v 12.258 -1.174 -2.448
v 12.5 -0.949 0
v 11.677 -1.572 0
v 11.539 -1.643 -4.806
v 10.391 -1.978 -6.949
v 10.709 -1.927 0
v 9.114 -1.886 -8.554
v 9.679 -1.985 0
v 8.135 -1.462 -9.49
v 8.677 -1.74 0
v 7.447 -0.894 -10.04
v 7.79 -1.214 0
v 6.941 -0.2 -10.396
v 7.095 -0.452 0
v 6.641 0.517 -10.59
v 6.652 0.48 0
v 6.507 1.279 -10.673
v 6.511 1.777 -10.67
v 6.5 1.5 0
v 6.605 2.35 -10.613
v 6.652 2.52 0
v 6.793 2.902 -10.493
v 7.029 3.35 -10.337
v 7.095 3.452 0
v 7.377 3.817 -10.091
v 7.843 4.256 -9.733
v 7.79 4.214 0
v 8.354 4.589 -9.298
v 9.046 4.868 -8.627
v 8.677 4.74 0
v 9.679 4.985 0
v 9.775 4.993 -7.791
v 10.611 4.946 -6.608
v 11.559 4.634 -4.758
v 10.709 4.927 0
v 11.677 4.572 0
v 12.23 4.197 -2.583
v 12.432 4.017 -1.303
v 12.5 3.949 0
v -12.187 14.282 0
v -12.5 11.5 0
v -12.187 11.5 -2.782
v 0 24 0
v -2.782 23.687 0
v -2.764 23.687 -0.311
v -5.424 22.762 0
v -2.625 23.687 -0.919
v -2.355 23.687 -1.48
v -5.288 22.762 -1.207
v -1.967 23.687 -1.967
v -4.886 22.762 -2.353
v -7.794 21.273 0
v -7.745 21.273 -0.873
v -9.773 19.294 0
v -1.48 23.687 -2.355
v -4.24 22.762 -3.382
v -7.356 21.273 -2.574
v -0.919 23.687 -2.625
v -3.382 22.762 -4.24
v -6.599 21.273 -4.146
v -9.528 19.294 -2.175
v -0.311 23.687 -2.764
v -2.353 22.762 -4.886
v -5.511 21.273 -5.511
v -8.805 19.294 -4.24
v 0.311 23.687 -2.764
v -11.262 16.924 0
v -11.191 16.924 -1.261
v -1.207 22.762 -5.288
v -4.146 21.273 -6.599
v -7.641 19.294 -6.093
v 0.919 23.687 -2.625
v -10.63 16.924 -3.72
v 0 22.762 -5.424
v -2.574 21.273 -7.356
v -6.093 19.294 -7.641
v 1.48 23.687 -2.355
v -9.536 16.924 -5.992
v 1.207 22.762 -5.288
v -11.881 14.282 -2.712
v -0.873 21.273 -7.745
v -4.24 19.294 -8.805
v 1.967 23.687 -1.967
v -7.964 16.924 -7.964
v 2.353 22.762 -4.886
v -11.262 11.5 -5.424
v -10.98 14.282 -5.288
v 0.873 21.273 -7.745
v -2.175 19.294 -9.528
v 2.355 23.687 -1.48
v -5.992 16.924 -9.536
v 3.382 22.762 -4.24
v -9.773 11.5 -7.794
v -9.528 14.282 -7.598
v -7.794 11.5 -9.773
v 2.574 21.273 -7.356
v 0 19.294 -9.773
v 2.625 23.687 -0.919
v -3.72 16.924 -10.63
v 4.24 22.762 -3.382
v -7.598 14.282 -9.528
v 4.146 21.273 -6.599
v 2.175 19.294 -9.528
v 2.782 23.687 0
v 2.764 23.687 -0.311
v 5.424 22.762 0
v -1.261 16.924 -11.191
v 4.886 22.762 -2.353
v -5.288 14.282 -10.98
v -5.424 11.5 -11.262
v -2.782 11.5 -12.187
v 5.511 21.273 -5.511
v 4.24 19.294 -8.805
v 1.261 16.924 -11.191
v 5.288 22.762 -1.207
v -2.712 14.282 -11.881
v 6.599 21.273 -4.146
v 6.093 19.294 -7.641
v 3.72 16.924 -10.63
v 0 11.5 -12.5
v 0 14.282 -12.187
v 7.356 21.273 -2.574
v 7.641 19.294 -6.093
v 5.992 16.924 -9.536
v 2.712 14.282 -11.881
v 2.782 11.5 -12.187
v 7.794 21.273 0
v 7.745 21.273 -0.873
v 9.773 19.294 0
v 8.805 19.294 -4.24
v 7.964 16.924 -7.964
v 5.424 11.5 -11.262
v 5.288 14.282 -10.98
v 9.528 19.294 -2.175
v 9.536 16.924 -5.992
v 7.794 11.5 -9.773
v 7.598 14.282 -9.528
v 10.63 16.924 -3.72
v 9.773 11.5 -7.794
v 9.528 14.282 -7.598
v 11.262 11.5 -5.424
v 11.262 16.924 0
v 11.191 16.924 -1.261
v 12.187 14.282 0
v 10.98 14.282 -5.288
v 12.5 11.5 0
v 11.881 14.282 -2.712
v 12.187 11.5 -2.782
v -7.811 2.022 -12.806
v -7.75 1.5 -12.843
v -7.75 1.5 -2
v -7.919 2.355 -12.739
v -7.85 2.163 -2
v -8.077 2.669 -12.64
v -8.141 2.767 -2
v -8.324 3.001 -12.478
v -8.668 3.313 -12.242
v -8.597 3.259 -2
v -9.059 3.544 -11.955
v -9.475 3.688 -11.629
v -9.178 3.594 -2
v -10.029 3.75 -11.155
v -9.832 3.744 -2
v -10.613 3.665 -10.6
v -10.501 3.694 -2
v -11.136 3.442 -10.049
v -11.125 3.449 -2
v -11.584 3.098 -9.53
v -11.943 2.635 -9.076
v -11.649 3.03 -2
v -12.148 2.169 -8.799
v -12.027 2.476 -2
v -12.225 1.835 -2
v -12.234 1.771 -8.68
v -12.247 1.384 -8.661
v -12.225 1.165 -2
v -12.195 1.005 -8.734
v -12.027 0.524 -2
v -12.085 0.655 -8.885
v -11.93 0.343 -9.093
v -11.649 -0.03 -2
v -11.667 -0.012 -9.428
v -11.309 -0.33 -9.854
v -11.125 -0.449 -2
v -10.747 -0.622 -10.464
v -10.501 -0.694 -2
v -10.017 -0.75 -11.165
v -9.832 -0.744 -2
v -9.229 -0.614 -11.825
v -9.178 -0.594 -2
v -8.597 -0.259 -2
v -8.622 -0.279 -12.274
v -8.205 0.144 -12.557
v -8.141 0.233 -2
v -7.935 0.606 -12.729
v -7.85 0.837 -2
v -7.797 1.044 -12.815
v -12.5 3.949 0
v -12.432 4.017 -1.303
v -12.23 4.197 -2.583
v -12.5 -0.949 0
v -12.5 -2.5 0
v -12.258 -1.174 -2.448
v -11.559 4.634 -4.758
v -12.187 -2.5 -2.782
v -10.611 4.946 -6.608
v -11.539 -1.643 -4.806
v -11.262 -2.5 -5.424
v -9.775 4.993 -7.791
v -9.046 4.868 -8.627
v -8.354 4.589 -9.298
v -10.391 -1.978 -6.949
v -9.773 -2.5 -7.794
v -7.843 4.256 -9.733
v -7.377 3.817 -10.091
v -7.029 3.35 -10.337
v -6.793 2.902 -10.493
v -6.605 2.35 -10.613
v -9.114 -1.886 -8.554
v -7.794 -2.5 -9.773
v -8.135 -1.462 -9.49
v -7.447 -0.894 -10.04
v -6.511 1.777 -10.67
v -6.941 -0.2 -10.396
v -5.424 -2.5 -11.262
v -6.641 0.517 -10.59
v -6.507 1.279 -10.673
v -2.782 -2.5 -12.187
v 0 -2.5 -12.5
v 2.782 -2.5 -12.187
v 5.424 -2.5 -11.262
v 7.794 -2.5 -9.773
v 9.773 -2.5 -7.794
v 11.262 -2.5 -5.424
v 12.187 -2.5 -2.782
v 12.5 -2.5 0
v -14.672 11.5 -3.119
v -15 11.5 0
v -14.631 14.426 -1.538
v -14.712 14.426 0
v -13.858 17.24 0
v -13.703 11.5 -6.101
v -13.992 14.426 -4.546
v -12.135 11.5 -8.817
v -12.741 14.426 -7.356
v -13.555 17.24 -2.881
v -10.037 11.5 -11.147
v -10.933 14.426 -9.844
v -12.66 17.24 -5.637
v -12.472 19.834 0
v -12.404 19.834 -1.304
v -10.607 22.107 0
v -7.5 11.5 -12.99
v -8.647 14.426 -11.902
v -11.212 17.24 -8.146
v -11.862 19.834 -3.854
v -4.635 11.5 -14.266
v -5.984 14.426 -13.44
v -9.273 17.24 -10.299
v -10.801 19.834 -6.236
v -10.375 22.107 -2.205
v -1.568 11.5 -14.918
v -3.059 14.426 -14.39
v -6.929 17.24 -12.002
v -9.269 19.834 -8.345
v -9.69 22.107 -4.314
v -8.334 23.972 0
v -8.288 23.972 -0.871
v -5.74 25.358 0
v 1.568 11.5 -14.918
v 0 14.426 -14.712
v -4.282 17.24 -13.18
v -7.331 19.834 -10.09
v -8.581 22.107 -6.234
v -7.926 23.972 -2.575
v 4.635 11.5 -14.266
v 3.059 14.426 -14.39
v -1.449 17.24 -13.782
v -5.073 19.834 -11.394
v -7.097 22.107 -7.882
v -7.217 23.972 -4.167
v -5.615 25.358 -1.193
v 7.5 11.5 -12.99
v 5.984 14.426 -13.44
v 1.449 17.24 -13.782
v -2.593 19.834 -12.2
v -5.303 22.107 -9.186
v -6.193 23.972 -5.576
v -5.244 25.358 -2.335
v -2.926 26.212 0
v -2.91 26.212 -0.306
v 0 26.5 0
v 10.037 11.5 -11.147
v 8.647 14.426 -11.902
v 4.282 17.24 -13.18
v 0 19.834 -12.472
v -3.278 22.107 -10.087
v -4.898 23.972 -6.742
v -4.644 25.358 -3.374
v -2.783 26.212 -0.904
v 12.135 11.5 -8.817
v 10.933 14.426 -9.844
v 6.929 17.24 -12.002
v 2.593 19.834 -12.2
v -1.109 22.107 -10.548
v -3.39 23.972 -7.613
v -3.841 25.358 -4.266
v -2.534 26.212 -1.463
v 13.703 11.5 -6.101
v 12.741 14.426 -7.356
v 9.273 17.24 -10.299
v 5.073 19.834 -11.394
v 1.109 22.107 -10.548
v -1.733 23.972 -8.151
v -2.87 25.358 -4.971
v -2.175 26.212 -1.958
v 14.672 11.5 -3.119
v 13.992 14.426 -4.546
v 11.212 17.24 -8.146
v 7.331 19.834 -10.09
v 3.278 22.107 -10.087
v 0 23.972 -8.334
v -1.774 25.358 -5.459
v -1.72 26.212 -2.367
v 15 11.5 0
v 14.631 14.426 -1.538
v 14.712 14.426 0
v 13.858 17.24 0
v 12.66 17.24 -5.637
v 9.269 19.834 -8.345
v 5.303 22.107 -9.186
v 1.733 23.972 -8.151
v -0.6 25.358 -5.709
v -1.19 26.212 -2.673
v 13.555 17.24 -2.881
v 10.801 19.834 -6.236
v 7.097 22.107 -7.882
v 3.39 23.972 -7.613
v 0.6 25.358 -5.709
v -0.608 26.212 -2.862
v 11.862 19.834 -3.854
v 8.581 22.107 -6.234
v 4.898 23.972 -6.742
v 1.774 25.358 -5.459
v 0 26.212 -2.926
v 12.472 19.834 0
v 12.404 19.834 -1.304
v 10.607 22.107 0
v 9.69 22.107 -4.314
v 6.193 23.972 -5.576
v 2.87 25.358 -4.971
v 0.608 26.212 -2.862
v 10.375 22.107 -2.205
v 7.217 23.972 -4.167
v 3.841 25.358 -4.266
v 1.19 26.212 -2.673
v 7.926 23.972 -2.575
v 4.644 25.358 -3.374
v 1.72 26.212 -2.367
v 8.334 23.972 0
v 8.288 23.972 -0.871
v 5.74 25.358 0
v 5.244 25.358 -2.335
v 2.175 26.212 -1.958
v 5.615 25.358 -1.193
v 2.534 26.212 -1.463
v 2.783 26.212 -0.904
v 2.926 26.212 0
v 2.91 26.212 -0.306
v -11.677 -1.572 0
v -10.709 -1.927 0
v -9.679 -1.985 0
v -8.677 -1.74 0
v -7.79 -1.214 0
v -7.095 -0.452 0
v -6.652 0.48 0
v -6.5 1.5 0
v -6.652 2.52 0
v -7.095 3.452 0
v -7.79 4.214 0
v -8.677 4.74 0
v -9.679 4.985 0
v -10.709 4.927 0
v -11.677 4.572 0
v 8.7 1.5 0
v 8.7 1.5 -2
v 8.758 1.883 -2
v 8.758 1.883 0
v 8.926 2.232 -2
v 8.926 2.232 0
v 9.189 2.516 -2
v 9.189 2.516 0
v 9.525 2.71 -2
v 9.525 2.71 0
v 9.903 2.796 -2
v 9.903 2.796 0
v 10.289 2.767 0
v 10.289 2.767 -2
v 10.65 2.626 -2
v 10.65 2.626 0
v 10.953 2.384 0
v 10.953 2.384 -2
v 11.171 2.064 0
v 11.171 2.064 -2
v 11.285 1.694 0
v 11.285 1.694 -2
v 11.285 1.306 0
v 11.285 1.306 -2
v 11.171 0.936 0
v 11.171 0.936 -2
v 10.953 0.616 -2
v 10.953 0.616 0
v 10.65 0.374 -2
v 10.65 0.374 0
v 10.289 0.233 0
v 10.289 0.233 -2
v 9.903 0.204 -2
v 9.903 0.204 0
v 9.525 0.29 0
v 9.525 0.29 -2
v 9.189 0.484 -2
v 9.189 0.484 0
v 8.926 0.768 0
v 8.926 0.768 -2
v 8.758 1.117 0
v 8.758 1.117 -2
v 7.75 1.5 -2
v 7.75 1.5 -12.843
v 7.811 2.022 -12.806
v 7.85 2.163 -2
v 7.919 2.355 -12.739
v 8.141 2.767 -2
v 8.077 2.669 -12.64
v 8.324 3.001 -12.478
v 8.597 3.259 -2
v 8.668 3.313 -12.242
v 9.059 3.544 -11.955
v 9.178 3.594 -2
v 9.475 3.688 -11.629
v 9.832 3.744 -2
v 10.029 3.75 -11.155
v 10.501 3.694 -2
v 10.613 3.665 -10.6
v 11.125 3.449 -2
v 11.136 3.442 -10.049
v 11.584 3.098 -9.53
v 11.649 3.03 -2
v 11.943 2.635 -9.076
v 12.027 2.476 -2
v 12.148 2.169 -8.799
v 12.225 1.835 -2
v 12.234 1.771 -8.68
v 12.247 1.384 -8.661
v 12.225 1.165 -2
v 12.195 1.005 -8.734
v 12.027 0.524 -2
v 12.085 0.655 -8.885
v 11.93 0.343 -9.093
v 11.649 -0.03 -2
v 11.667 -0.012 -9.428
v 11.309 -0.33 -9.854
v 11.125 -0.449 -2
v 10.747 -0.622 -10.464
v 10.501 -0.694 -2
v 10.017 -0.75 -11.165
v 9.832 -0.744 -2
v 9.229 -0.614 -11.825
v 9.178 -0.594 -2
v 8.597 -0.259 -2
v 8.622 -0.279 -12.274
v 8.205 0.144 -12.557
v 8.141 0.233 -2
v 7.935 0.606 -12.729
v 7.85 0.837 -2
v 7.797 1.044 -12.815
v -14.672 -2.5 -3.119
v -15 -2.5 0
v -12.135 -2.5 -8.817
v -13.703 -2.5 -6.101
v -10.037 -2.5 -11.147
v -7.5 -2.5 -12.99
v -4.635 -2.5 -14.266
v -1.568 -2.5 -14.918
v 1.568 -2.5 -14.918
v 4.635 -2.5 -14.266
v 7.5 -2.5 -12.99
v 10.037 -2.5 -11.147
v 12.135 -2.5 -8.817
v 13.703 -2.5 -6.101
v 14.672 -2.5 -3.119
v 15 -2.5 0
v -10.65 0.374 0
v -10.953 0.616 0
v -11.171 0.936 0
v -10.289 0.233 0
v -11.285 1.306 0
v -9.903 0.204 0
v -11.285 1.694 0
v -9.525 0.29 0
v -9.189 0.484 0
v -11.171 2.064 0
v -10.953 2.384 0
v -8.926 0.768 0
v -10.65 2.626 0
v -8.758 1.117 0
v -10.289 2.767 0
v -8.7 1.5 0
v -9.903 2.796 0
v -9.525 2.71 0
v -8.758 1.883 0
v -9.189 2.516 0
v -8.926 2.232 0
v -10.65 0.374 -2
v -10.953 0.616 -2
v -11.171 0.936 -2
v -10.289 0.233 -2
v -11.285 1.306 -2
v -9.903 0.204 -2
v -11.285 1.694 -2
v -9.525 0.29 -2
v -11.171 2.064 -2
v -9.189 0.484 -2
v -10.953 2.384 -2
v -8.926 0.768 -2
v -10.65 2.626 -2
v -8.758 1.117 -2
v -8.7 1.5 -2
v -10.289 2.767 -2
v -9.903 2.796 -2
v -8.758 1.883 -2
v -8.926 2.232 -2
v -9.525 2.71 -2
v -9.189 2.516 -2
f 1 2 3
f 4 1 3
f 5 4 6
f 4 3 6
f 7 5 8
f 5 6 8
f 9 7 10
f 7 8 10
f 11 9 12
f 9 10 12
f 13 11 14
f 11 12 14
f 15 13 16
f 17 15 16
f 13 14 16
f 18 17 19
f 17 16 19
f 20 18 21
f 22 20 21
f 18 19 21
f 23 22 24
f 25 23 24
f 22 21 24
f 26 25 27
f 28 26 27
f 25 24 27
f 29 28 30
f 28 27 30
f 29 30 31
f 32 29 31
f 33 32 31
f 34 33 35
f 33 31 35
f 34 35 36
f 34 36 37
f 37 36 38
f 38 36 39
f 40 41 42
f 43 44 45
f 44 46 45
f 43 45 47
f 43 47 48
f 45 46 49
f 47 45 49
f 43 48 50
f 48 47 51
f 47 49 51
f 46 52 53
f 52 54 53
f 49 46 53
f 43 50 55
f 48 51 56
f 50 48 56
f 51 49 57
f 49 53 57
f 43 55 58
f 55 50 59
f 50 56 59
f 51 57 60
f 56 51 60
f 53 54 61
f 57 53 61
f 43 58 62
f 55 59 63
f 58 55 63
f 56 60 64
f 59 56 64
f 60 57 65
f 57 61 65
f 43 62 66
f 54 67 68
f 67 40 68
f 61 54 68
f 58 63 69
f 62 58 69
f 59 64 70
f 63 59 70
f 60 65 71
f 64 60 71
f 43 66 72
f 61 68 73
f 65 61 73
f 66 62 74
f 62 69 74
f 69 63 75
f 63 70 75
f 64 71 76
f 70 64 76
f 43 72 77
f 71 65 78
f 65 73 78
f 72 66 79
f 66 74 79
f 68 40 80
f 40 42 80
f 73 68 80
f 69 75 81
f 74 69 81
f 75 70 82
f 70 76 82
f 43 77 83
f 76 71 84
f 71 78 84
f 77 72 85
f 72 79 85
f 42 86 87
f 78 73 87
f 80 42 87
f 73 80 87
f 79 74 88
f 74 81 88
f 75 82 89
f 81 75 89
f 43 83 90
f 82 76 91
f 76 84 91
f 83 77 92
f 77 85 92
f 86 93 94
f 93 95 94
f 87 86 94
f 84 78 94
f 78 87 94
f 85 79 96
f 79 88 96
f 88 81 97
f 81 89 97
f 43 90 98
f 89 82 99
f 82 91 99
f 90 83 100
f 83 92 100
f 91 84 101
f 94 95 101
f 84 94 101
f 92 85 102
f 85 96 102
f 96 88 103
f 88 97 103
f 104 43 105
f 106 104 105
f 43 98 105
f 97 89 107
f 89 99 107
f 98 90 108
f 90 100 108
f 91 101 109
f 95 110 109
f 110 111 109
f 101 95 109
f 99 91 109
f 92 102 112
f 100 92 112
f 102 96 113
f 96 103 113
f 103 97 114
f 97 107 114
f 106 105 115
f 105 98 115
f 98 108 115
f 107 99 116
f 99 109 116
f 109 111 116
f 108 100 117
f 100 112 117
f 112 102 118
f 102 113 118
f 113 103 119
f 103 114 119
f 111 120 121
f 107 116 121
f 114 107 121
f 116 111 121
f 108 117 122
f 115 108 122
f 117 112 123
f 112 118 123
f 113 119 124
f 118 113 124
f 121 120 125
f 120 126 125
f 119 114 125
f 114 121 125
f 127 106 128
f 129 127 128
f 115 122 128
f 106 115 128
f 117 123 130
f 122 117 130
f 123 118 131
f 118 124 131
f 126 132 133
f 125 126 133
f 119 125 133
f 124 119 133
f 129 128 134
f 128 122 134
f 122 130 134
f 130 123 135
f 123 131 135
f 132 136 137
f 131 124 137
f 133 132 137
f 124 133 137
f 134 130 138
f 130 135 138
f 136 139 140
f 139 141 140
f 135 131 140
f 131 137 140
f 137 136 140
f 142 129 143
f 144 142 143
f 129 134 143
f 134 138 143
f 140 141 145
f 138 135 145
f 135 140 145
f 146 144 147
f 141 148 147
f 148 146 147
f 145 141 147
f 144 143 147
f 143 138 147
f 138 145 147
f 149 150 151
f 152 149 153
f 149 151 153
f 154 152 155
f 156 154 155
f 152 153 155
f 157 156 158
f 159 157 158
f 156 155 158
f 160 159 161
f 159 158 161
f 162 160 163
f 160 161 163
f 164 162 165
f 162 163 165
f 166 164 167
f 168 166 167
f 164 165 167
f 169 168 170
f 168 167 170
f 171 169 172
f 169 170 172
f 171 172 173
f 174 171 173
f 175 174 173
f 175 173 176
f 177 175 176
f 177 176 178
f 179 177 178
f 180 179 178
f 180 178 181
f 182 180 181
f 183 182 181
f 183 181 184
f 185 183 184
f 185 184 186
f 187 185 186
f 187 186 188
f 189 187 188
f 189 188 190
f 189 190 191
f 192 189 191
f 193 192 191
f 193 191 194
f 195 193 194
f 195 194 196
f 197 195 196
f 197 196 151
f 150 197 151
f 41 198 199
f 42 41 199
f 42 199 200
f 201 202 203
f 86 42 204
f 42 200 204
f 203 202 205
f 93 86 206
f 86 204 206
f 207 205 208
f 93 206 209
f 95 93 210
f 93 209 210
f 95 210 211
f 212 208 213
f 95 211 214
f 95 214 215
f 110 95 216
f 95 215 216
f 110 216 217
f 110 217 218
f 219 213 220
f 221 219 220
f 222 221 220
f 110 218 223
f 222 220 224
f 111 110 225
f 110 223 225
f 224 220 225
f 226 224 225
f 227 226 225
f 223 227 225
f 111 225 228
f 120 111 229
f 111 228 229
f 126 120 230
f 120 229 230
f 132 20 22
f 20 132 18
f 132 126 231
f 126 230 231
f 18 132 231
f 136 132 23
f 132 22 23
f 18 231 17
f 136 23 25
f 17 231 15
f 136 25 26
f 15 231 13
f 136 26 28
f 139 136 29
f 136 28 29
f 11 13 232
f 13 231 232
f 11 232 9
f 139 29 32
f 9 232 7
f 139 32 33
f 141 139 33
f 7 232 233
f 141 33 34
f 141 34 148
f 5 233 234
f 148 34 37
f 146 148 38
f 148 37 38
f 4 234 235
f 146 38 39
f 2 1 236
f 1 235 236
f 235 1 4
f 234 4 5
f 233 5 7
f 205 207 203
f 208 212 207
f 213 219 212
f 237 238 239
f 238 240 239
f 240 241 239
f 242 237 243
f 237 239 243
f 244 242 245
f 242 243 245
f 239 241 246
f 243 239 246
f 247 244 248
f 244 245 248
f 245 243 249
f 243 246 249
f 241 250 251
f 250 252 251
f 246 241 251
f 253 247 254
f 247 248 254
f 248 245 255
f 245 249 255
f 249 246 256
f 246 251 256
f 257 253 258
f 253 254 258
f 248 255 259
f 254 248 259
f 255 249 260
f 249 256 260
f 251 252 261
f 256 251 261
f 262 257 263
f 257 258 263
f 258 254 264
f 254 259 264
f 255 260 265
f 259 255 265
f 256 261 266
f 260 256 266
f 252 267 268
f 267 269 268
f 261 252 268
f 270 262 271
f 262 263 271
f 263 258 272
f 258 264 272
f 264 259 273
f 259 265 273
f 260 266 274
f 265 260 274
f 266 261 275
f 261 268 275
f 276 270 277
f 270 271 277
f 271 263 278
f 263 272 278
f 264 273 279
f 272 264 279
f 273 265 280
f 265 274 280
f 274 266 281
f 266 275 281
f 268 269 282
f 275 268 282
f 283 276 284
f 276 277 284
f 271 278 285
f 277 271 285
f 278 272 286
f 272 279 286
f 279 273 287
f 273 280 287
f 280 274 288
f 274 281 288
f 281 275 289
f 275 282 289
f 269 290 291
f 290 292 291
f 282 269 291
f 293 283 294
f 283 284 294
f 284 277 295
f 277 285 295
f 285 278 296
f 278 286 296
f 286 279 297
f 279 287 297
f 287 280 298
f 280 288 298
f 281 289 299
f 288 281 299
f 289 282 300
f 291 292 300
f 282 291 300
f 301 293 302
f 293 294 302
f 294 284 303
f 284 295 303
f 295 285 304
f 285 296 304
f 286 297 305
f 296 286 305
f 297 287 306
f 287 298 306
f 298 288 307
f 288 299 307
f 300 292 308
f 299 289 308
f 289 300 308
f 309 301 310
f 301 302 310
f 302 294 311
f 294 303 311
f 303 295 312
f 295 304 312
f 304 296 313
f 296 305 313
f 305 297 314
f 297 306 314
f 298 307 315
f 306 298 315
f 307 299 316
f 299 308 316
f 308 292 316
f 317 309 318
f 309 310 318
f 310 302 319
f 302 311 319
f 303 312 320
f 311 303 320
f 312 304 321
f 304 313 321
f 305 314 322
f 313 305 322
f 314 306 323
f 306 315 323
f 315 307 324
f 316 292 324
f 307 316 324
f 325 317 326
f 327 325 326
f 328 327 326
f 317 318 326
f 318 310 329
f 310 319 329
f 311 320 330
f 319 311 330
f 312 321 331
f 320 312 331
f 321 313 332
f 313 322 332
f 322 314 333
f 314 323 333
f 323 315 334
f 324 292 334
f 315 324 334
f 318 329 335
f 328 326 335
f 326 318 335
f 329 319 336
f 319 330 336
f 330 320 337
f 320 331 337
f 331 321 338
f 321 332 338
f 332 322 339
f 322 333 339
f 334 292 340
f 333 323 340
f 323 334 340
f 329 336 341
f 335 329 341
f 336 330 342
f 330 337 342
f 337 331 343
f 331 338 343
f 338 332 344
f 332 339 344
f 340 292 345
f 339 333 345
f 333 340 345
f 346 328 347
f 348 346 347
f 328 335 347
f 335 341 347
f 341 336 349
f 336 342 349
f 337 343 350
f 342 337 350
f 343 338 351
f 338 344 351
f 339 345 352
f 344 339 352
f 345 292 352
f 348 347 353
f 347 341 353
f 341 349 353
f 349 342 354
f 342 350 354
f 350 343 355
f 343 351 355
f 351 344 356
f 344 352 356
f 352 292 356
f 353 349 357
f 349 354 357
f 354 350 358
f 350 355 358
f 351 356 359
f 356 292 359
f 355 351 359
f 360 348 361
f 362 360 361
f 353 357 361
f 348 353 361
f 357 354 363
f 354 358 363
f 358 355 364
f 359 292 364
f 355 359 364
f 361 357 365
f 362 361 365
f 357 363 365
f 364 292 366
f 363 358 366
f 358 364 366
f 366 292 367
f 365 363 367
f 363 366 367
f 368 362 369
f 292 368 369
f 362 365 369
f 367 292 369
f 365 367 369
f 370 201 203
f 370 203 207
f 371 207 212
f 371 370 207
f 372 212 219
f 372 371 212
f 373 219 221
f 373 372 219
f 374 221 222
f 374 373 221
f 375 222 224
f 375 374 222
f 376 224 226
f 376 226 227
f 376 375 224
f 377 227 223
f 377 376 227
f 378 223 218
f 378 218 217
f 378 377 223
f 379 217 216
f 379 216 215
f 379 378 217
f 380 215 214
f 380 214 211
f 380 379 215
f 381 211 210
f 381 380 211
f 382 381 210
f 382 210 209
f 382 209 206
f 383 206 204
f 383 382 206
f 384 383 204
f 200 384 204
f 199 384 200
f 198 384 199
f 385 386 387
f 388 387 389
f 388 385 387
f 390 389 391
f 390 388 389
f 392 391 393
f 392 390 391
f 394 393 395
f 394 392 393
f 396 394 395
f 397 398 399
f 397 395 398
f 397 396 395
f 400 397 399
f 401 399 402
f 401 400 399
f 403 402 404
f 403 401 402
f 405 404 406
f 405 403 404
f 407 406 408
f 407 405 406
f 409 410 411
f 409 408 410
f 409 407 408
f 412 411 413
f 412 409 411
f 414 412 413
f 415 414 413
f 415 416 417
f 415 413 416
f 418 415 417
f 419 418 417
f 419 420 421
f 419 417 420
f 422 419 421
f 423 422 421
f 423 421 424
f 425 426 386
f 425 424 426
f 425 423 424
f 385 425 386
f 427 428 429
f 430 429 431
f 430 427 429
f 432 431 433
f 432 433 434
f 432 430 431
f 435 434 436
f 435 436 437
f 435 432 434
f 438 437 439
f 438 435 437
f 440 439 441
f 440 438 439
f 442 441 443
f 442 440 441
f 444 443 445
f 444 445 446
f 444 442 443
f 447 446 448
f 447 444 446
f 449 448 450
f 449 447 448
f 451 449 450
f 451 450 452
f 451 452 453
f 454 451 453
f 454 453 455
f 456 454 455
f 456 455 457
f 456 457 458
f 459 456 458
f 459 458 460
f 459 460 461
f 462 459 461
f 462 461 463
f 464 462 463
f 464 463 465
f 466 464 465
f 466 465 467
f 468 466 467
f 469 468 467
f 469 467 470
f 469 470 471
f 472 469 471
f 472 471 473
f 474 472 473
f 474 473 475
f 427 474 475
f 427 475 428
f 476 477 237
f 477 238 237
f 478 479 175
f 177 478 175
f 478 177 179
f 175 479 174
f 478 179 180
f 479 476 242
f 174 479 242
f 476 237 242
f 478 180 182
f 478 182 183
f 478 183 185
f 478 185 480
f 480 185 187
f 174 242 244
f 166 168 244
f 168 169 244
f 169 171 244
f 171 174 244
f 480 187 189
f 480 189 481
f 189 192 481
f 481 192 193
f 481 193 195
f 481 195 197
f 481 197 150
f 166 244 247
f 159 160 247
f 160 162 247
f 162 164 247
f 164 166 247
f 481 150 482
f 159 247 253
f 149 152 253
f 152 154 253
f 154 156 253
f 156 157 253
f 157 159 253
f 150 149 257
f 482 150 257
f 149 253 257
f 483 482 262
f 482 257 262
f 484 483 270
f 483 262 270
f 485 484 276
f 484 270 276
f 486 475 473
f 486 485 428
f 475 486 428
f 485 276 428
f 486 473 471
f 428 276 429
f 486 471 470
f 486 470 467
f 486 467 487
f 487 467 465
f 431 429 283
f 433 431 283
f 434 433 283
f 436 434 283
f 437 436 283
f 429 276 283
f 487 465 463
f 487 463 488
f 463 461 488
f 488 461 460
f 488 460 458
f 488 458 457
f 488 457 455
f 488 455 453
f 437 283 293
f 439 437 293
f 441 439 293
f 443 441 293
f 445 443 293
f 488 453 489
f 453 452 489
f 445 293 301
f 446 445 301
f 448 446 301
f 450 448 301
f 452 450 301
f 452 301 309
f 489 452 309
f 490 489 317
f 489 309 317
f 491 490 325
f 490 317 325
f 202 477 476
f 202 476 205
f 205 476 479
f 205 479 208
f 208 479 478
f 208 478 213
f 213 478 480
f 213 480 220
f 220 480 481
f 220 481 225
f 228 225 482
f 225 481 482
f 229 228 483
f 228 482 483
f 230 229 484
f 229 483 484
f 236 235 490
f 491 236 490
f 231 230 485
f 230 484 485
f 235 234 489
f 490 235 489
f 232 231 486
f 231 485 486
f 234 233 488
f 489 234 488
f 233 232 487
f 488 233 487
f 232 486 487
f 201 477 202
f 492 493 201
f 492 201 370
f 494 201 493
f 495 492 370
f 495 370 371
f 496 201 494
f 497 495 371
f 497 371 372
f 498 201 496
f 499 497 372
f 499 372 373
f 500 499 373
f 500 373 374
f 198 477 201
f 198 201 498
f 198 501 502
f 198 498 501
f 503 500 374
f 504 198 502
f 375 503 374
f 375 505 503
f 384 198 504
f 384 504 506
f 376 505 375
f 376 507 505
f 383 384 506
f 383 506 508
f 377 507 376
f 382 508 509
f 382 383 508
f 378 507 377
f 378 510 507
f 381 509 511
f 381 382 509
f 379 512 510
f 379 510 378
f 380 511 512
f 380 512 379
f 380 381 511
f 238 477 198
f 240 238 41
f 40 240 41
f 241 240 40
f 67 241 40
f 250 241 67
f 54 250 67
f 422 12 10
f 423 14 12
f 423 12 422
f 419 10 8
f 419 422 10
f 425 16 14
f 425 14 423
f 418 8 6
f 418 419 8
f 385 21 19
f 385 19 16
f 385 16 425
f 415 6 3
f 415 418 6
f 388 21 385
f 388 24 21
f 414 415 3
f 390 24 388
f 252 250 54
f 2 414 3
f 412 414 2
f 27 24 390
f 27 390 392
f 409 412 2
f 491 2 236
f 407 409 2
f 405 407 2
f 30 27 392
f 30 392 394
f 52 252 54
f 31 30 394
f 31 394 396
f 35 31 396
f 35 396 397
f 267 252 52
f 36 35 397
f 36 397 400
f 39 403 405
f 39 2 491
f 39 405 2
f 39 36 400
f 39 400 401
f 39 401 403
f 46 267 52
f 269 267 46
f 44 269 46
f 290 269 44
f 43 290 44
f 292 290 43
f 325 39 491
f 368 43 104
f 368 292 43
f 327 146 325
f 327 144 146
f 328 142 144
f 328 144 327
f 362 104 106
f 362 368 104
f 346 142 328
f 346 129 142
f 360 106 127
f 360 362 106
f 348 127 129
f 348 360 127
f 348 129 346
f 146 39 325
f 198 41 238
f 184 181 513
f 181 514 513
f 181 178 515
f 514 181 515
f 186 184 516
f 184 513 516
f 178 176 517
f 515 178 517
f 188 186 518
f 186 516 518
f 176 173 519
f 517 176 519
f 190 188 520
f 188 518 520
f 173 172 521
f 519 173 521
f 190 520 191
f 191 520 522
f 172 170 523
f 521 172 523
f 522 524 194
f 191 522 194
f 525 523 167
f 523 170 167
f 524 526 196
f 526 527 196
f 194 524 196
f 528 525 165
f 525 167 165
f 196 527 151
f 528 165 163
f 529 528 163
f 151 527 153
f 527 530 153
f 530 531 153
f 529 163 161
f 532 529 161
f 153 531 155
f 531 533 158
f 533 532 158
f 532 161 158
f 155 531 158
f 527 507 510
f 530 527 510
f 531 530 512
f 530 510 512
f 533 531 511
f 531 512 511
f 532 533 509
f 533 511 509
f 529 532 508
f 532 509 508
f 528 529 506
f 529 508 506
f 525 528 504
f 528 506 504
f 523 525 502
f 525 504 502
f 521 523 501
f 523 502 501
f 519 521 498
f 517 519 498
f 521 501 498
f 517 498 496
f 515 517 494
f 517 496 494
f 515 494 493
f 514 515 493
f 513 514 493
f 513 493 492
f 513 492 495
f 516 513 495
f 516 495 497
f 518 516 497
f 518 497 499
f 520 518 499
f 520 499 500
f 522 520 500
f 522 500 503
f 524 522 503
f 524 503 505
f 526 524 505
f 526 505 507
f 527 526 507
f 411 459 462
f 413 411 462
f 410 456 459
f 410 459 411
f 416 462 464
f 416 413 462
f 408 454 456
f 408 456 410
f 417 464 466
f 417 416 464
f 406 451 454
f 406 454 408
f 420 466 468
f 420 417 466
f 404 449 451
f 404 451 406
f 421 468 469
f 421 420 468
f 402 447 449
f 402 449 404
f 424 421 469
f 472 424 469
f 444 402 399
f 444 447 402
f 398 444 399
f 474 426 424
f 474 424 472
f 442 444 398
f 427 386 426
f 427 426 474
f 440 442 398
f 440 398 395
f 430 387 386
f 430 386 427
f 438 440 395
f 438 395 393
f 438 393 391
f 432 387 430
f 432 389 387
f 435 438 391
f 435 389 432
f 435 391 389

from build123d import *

# Parameters (mm, degrees)
ROTATION1_ANGLE                 = 180
AUFSATZ_LINEAR_AUSTRAGEN1_REACH = 35.945
SKIZZE2_R                       = 3.5
SKIZZE4_R                       = 1.3
SCHNITT_LINEAR_AUSTRAGEN1_DEPTH = 34.944808145
SCHNITT_LINEAR_START            = -2
SKIZZE5_R                       = 2.25
SCHNITT_LINEAR_AUSTRAGEN2_DEPTH = 32.944808233


with BuildPart() as part:
    # Skizze1 → Rotation1 (revolve)
    with BuildSketch(Plane.XY):
        with BuildLine():
            Line((0, 26.5), (0, 24))
            ThreePointArc((0, 24), (-8.838834765, 20.338834765), (-12.5, 11.5))
            Line((-12.5, 11.5), (-12.5, 3.158312395))
            Line((-12.5, 3.158312395), (-12.5, -0.158312395))
            Line((-12.5, -0.158312395), (-12.5, -2.5))
            Line((-12.5, -2.5), (-15, -2.5))
            Line((-15, -2.5), (-15, 11.5))
            ThreePointArc((-15, 11.5), (-10.606601718, 22.106601718), (0, 26.5))
        make_face()
    revolve(axis=Axis((0, 26.5, 0), (0, -1, 0)), revolution_arc=ROTATION1_ANGLE)

    # Skizze2 → Aufsatz-Linear austragen1 (add, up to next)
    with BuildSketch(Plane.XY, mode=Mode.PRIVATE) as aufsatz_linear_austragen1_sk1:
        with Locations((-10, 1.5)):
            Circle(SKIZZE2_R)
        with BuildLine():
            ThreePointArc((-12.5, -0.158312395), (-7, 1.5), (-12.5, 3.158312395))
            Line((-12.5, 3.158312395), (-12.5, -0.158312395))
        make_face(mode=Mode.SUBTRACT)
    aufsatz_linear_austragen1_tool1 = extrude(aufsatz_linear_austragen1_sk1.sketch, amount=-AUFSATZ_LINEAR_AUSTRAGEN1_REACH, mode=Mode.PRIVATE) - part.part
    # Skizze2 → Aufsatz-Linear austragen1 (add, up to next)
    with BuildSketch(Plane.XY, mode=Mode.PRIVATE) as aufsatz_linear_austragen1_sk2:
        with BuildLine():
            Line((-12.5, 3.158312395), (-12.5, -0.158312395))
            ThreePointArc((-12.5, -0.158312395), (-7, 1.5), (-12.5, 3.158312395))
        make_face()
    aufsatz_linear_austragen1_tool2 = extrude(aufsatz_linear_austragen1_sk2.sketch, amount=-AUFSATZ_LINEAR_AUSTRAGEN1_REACH, mode=Mode.PRIVATE) - part.part
    aufsatz_linear_austragen1_1 = aufsatz_linear_austragen1_tool1.solids().sort_by_distance((-13.401005, 1.5, 0))[0]
    add(aufsatz_linear_austragen1_1)
    aufsatz_linear_austragen1_2 = aufsatz_linear_austragen1_tool2.solids().sort_by_distance((-9.888016, 1.5, 0))[0]
    add(aufsatz_linear_austragen1_2)
    aufsatz_linear_austragen1 = aufsatz_linear_austragen1_1 + aufsatz_linear_austragen1_2  # Aufsatz-Linear austragen1 as one shape, for the pattern or mirror that repeats it

    # Skizze4 → Schnitt-Linear austragen1 (cut, through all)
    with BuildSketch(Plane.XY):
        with Locations((-10, 1.5)):
            Circle(SKIZZE4_R)
    schnitt_linear_austragen1 = extrude(amount=-SCHNITT_LINEAR_AUSTRAGEN1_DEPTH, mode=Mode.SUBTRACT)

    # Skizze5 → Schnitt-Linear austragen2 (cut, through all)
    with BuildSketch(Plane.XY.offset(SCHNITT_LINEAR_START)):
        with Locations((-10, 1.5)):
            Circle(SKIZZE5_R)
    schnitt_linear_austragen2 = extrude(amount=-SCHNITT_LINEAR_AUSTRAGEN2_DEPTH, mode=Mode.SUBTRACT)

    # Spiegeln1: Aufsatz-Linear austragen1, Schnitt-Linear austragen1, Schnitt-Linear austragen2 across plane
    add(aufsatz_linear_austragen1.mirror(Plane(origin=(0, 0, 0), x_dir=(0, 0, 1), z_dir=(1, 0, 0))))
    add(schnitt_linear_austragen1.mirror(Plane(origin=(0, 0, 0), x_dir=(0, 0, 1), z_dir=(1, 0, 0))), mode=Mode.SUBTRACT)
    add(schnitt_linear_austragen2.mirror(Plane(origin=(0, 0, 0), x_dir=(0, 0, 1), z_dir=(1, 0, 0))), mode=Mode.SUBTRACT)


solid = part.part
